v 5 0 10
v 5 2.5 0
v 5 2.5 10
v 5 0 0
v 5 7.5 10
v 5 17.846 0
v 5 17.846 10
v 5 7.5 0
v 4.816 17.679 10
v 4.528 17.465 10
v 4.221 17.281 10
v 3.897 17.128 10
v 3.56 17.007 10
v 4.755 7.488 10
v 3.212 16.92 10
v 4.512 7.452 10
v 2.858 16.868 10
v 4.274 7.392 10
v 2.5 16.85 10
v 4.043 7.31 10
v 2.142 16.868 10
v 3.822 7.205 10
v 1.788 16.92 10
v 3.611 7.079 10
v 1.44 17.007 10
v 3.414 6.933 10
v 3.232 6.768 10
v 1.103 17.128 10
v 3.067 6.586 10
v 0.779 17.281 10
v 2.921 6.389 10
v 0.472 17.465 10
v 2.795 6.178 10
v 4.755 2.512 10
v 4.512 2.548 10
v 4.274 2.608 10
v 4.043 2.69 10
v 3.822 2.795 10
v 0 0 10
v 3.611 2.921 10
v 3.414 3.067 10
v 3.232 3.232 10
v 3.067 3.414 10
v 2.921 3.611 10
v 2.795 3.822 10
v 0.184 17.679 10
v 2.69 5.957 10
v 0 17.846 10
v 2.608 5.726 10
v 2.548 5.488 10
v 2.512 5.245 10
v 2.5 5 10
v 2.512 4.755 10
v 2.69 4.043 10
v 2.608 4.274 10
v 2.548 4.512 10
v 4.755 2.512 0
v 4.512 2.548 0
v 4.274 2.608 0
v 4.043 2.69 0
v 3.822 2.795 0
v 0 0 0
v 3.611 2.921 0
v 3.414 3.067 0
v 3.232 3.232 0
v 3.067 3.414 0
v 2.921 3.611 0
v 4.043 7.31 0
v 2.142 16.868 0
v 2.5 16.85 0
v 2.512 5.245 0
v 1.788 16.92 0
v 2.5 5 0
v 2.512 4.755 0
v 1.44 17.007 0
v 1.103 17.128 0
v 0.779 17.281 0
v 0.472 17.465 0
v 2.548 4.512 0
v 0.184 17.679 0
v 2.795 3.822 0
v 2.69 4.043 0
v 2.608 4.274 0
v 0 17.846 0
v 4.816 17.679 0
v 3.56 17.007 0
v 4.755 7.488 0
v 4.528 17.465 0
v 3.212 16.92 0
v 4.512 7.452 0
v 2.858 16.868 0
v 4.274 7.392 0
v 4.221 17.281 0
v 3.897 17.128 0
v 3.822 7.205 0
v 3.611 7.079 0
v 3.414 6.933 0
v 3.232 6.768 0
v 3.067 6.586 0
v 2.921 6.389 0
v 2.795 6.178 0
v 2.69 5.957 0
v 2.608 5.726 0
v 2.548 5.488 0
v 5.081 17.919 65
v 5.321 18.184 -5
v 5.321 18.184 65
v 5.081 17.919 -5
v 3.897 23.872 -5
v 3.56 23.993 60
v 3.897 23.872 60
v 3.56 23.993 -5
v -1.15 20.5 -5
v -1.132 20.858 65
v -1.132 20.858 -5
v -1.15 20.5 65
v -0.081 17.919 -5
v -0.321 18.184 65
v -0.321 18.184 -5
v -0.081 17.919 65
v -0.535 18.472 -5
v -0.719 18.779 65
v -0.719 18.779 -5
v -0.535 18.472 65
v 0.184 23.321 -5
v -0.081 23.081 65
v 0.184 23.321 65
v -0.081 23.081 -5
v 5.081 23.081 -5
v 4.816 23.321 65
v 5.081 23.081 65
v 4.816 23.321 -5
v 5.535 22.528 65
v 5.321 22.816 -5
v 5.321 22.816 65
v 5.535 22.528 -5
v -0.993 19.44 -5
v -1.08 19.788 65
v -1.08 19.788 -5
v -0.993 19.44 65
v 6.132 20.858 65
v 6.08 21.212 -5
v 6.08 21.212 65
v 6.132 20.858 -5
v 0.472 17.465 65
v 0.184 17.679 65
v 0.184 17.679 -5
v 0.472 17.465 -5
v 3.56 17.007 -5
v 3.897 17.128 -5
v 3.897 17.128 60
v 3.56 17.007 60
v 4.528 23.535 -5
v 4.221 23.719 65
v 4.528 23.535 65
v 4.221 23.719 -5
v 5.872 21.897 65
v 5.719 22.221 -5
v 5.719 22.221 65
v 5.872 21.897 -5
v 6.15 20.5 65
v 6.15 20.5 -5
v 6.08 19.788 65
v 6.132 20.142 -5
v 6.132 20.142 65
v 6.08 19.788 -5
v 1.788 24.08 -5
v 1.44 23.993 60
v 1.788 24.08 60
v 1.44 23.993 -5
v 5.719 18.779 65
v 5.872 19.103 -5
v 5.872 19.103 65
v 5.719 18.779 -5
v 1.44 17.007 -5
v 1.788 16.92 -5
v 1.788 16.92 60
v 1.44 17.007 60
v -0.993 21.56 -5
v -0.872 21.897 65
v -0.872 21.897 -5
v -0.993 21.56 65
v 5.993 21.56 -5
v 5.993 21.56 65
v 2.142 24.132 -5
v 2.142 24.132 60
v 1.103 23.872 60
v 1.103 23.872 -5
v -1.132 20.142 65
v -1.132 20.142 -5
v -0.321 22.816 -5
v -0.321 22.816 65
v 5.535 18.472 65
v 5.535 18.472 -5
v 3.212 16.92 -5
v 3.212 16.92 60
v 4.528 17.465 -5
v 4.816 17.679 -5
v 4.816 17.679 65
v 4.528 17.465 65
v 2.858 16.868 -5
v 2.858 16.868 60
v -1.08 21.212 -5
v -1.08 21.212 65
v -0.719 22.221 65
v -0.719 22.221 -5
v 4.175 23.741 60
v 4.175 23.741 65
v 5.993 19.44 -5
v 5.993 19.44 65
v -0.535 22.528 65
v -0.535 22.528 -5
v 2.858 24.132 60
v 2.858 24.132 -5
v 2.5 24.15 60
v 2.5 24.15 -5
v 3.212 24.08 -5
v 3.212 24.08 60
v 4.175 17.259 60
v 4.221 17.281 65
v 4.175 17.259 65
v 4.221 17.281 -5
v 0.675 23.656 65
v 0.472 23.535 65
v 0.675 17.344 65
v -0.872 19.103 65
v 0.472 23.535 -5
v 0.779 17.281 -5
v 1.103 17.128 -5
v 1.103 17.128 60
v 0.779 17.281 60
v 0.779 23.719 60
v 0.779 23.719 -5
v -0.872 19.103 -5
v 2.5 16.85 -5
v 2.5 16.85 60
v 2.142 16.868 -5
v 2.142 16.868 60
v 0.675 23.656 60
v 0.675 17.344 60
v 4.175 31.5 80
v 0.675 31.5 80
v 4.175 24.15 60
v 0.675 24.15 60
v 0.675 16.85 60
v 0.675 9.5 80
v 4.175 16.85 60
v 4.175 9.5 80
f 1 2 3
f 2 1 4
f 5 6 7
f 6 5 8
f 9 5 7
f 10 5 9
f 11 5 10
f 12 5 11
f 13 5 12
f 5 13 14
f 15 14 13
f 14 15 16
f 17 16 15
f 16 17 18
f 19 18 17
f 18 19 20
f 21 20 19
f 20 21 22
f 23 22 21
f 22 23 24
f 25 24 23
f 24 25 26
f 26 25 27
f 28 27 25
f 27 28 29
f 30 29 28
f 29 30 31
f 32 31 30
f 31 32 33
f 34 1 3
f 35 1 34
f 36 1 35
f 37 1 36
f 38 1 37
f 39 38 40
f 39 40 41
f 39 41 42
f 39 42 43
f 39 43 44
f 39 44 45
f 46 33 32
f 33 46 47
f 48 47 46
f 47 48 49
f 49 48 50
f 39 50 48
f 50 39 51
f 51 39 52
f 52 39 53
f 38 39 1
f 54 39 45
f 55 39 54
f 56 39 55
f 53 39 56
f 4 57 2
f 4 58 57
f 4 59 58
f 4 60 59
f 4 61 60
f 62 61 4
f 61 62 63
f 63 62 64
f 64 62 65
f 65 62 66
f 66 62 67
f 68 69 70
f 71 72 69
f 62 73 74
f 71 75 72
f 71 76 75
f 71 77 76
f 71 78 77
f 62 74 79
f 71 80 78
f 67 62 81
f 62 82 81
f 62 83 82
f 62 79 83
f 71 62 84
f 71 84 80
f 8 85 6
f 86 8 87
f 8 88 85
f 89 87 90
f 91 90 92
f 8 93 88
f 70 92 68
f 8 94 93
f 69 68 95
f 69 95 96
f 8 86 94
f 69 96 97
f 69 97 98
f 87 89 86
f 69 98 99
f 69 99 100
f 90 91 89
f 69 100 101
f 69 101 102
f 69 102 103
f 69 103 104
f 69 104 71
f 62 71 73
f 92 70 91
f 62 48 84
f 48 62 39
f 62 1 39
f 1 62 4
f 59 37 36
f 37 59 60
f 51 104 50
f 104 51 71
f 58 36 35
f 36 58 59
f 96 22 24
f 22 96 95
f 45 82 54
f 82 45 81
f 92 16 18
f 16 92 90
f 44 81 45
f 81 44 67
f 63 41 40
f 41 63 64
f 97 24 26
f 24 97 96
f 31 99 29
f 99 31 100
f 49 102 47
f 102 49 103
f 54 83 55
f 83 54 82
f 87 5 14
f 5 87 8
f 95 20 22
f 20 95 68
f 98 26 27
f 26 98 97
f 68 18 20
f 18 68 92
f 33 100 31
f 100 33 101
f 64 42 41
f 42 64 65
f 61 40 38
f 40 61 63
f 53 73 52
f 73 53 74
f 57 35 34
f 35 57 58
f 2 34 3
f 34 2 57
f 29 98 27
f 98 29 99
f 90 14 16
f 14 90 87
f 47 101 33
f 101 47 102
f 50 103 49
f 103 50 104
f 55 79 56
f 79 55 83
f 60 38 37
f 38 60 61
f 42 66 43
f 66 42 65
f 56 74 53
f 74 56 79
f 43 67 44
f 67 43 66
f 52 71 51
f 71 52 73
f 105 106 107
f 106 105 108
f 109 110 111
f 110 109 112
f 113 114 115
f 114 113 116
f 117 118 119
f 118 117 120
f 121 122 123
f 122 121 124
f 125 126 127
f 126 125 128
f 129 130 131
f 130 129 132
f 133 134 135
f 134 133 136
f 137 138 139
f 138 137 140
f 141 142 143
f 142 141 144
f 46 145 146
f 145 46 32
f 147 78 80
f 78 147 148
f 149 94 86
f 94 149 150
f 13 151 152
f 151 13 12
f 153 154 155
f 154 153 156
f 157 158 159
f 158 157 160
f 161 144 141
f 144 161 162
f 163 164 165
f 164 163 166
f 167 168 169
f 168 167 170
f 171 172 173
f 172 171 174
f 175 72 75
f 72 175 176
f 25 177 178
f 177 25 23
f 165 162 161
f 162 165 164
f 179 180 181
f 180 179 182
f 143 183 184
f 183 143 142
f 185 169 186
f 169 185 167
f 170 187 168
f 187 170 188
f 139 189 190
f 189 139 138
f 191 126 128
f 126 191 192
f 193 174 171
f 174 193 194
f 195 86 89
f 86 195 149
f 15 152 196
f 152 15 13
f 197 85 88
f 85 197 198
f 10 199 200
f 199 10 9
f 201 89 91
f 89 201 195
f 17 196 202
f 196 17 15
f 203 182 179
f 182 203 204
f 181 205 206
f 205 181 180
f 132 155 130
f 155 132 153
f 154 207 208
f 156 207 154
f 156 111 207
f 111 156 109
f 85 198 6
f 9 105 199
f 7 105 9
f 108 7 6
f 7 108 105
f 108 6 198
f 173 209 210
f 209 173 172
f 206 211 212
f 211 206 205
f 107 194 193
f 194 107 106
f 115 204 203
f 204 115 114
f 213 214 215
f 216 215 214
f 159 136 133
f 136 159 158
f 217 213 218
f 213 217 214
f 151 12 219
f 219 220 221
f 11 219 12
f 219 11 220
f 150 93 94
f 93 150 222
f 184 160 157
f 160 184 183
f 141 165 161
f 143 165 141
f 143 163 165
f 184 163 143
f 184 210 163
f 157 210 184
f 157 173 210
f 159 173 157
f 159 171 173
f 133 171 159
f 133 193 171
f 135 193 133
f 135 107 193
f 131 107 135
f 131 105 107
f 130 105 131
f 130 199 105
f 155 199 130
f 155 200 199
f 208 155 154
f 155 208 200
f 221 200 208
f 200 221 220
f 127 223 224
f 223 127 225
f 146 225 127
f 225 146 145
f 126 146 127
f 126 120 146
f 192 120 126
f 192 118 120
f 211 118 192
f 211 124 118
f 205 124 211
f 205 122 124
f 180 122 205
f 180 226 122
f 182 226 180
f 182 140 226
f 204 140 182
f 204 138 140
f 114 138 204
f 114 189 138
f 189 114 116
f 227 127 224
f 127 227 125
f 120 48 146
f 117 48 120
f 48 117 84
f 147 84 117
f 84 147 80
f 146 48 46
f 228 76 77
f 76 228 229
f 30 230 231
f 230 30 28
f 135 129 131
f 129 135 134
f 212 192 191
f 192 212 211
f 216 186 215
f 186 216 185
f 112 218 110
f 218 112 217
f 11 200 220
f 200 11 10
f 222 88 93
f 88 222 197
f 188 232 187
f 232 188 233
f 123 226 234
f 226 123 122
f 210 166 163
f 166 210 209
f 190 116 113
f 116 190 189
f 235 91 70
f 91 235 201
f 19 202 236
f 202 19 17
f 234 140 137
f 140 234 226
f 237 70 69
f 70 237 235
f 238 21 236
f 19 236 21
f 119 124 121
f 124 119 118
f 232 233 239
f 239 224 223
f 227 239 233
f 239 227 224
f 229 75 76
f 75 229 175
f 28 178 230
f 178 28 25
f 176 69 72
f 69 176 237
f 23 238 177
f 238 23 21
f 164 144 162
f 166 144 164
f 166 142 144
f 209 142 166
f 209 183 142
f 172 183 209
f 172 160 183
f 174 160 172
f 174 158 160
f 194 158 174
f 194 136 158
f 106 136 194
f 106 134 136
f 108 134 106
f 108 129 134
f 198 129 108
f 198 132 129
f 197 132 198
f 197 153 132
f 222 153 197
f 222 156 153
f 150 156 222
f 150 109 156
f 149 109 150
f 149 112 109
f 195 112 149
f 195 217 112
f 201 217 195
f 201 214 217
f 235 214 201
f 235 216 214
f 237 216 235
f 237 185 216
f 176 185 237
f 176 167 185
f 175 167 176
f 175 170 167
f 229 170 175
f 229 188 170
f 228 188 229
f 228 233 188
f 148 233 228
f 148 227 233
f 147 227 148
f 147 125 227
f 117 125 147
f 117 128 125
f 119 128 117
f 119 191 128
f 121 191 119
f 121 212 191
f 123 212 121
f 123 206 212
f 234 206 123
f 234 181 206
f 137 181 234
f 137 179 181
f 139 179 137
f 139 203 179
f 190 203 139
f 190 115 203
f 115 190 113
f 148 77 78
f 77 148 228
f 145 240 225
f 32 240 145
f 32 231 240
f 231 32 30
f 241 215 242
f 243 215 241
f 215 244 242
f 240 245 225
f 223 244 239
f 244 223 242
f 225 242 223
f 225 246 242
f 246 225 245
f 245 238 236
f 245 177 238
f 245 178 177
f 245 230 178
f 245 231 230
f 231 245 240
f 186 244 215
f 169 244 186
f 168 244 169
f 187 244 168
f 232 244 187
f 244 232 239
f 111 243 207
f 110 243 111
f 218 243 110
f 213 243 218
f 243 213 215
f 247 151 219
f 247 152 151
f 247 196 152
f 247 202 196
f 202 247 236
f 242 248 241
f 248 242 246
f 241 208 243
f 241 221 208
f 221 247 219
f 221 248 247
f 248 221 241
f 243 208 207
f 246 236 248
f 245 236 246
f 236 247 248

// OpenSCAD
// Deko-Buntbartschlüssel (nicht funktional)
// Maße bewusst generisch und nicht kompatibel zu realen Schlössern

/* v0.1
$fn = 64;
// Gesamtlänge ~80 mm
module schluessel() {
    // Griff (rund)
    difference() {
        cylinder(h = 6, r = 15);
        cylinder(h = 6, r = 7);
    }x
    // Schaft
    translate([0,0,0])
        cylinder(h = 50, r = 3);
    // Gerader Bart (rein dekorativ)
    translate([-3, -1.5, 50])
        cube([6, 12, 3]);
}

schluessel();
*/
// Deko-Buntbartschlüssel (nicht funktional)
// Griff sitzt bündig oben am Schaft

$fn = 64;

module schluessel() {
    // Schaft
    schaft_hoehe = 70;
    bart_durch = 7.3;
    schaft_rad = bart_durch / 2;
    cylinder(h = schaft_hoehe, r = schaft_rad);

    // Griff (rund), direkt auf Schaft
    /*
    translate([-2.5, -7.5, schaft_hoehe])
    cube([5,15,25]);
*/
    g_di = 3.5;
    translate([-g_di/2, 0, schaft_hoehe])
        rotate([90, 0, 90])
            linear_extrude(height = g_di)
                polygon(points=[
                    [-bart_durch/2, -10],  // unten links (schmaler)
                    [ bart_durch/2, -10],  // unten rechts
                    [ 11,  10],  // oben rechts (breiter)
                    [-11,  10]   // oben links
                ])
    ;   
    bart_x = 5.5;
    // Gerader, dekorativer Bart
    translate([-bart_x/2, 0, 5])
        cube([bart_x, 20.5-schaft_rad, 10]);
    
}

//schluessel();
module schluessel2(){
    // bart
    bart_x = 5;
    bart_y = 20.5;
    bart_z = 10;
    difference()
    {
        cube([bart_x, bart_y, bart_z]);
        translate([5,5,0])
        cylinder(h=bart_z, r = 0.5*bart_x);
    }
    // schaft
    schaft_hoehe = 70;
    schaft_durch = 7.3;
    schaft_rad = schaft_durch / 2;
    schaft_y = bart_y;
    translate([bart_x/2,schaft_y,-5])
    cylinder(h = schaft_hoehe, r = schaft_rad);
    // griff
    g_di = 3.5;
    translate([bart_x/2-schaft_rad/2, schaft_y, schaft_hoehe])
        rotate([90, 0, 90])
            linear_extrude(height = g_di)
                polygon(points=[
                    [-schaft_durch/2, -10],
                    [ schaft_durch/2, -10], 
                    [ 11,  10], 
                    [-11,  10]
                ])
    ;   
}
schluessel2();
